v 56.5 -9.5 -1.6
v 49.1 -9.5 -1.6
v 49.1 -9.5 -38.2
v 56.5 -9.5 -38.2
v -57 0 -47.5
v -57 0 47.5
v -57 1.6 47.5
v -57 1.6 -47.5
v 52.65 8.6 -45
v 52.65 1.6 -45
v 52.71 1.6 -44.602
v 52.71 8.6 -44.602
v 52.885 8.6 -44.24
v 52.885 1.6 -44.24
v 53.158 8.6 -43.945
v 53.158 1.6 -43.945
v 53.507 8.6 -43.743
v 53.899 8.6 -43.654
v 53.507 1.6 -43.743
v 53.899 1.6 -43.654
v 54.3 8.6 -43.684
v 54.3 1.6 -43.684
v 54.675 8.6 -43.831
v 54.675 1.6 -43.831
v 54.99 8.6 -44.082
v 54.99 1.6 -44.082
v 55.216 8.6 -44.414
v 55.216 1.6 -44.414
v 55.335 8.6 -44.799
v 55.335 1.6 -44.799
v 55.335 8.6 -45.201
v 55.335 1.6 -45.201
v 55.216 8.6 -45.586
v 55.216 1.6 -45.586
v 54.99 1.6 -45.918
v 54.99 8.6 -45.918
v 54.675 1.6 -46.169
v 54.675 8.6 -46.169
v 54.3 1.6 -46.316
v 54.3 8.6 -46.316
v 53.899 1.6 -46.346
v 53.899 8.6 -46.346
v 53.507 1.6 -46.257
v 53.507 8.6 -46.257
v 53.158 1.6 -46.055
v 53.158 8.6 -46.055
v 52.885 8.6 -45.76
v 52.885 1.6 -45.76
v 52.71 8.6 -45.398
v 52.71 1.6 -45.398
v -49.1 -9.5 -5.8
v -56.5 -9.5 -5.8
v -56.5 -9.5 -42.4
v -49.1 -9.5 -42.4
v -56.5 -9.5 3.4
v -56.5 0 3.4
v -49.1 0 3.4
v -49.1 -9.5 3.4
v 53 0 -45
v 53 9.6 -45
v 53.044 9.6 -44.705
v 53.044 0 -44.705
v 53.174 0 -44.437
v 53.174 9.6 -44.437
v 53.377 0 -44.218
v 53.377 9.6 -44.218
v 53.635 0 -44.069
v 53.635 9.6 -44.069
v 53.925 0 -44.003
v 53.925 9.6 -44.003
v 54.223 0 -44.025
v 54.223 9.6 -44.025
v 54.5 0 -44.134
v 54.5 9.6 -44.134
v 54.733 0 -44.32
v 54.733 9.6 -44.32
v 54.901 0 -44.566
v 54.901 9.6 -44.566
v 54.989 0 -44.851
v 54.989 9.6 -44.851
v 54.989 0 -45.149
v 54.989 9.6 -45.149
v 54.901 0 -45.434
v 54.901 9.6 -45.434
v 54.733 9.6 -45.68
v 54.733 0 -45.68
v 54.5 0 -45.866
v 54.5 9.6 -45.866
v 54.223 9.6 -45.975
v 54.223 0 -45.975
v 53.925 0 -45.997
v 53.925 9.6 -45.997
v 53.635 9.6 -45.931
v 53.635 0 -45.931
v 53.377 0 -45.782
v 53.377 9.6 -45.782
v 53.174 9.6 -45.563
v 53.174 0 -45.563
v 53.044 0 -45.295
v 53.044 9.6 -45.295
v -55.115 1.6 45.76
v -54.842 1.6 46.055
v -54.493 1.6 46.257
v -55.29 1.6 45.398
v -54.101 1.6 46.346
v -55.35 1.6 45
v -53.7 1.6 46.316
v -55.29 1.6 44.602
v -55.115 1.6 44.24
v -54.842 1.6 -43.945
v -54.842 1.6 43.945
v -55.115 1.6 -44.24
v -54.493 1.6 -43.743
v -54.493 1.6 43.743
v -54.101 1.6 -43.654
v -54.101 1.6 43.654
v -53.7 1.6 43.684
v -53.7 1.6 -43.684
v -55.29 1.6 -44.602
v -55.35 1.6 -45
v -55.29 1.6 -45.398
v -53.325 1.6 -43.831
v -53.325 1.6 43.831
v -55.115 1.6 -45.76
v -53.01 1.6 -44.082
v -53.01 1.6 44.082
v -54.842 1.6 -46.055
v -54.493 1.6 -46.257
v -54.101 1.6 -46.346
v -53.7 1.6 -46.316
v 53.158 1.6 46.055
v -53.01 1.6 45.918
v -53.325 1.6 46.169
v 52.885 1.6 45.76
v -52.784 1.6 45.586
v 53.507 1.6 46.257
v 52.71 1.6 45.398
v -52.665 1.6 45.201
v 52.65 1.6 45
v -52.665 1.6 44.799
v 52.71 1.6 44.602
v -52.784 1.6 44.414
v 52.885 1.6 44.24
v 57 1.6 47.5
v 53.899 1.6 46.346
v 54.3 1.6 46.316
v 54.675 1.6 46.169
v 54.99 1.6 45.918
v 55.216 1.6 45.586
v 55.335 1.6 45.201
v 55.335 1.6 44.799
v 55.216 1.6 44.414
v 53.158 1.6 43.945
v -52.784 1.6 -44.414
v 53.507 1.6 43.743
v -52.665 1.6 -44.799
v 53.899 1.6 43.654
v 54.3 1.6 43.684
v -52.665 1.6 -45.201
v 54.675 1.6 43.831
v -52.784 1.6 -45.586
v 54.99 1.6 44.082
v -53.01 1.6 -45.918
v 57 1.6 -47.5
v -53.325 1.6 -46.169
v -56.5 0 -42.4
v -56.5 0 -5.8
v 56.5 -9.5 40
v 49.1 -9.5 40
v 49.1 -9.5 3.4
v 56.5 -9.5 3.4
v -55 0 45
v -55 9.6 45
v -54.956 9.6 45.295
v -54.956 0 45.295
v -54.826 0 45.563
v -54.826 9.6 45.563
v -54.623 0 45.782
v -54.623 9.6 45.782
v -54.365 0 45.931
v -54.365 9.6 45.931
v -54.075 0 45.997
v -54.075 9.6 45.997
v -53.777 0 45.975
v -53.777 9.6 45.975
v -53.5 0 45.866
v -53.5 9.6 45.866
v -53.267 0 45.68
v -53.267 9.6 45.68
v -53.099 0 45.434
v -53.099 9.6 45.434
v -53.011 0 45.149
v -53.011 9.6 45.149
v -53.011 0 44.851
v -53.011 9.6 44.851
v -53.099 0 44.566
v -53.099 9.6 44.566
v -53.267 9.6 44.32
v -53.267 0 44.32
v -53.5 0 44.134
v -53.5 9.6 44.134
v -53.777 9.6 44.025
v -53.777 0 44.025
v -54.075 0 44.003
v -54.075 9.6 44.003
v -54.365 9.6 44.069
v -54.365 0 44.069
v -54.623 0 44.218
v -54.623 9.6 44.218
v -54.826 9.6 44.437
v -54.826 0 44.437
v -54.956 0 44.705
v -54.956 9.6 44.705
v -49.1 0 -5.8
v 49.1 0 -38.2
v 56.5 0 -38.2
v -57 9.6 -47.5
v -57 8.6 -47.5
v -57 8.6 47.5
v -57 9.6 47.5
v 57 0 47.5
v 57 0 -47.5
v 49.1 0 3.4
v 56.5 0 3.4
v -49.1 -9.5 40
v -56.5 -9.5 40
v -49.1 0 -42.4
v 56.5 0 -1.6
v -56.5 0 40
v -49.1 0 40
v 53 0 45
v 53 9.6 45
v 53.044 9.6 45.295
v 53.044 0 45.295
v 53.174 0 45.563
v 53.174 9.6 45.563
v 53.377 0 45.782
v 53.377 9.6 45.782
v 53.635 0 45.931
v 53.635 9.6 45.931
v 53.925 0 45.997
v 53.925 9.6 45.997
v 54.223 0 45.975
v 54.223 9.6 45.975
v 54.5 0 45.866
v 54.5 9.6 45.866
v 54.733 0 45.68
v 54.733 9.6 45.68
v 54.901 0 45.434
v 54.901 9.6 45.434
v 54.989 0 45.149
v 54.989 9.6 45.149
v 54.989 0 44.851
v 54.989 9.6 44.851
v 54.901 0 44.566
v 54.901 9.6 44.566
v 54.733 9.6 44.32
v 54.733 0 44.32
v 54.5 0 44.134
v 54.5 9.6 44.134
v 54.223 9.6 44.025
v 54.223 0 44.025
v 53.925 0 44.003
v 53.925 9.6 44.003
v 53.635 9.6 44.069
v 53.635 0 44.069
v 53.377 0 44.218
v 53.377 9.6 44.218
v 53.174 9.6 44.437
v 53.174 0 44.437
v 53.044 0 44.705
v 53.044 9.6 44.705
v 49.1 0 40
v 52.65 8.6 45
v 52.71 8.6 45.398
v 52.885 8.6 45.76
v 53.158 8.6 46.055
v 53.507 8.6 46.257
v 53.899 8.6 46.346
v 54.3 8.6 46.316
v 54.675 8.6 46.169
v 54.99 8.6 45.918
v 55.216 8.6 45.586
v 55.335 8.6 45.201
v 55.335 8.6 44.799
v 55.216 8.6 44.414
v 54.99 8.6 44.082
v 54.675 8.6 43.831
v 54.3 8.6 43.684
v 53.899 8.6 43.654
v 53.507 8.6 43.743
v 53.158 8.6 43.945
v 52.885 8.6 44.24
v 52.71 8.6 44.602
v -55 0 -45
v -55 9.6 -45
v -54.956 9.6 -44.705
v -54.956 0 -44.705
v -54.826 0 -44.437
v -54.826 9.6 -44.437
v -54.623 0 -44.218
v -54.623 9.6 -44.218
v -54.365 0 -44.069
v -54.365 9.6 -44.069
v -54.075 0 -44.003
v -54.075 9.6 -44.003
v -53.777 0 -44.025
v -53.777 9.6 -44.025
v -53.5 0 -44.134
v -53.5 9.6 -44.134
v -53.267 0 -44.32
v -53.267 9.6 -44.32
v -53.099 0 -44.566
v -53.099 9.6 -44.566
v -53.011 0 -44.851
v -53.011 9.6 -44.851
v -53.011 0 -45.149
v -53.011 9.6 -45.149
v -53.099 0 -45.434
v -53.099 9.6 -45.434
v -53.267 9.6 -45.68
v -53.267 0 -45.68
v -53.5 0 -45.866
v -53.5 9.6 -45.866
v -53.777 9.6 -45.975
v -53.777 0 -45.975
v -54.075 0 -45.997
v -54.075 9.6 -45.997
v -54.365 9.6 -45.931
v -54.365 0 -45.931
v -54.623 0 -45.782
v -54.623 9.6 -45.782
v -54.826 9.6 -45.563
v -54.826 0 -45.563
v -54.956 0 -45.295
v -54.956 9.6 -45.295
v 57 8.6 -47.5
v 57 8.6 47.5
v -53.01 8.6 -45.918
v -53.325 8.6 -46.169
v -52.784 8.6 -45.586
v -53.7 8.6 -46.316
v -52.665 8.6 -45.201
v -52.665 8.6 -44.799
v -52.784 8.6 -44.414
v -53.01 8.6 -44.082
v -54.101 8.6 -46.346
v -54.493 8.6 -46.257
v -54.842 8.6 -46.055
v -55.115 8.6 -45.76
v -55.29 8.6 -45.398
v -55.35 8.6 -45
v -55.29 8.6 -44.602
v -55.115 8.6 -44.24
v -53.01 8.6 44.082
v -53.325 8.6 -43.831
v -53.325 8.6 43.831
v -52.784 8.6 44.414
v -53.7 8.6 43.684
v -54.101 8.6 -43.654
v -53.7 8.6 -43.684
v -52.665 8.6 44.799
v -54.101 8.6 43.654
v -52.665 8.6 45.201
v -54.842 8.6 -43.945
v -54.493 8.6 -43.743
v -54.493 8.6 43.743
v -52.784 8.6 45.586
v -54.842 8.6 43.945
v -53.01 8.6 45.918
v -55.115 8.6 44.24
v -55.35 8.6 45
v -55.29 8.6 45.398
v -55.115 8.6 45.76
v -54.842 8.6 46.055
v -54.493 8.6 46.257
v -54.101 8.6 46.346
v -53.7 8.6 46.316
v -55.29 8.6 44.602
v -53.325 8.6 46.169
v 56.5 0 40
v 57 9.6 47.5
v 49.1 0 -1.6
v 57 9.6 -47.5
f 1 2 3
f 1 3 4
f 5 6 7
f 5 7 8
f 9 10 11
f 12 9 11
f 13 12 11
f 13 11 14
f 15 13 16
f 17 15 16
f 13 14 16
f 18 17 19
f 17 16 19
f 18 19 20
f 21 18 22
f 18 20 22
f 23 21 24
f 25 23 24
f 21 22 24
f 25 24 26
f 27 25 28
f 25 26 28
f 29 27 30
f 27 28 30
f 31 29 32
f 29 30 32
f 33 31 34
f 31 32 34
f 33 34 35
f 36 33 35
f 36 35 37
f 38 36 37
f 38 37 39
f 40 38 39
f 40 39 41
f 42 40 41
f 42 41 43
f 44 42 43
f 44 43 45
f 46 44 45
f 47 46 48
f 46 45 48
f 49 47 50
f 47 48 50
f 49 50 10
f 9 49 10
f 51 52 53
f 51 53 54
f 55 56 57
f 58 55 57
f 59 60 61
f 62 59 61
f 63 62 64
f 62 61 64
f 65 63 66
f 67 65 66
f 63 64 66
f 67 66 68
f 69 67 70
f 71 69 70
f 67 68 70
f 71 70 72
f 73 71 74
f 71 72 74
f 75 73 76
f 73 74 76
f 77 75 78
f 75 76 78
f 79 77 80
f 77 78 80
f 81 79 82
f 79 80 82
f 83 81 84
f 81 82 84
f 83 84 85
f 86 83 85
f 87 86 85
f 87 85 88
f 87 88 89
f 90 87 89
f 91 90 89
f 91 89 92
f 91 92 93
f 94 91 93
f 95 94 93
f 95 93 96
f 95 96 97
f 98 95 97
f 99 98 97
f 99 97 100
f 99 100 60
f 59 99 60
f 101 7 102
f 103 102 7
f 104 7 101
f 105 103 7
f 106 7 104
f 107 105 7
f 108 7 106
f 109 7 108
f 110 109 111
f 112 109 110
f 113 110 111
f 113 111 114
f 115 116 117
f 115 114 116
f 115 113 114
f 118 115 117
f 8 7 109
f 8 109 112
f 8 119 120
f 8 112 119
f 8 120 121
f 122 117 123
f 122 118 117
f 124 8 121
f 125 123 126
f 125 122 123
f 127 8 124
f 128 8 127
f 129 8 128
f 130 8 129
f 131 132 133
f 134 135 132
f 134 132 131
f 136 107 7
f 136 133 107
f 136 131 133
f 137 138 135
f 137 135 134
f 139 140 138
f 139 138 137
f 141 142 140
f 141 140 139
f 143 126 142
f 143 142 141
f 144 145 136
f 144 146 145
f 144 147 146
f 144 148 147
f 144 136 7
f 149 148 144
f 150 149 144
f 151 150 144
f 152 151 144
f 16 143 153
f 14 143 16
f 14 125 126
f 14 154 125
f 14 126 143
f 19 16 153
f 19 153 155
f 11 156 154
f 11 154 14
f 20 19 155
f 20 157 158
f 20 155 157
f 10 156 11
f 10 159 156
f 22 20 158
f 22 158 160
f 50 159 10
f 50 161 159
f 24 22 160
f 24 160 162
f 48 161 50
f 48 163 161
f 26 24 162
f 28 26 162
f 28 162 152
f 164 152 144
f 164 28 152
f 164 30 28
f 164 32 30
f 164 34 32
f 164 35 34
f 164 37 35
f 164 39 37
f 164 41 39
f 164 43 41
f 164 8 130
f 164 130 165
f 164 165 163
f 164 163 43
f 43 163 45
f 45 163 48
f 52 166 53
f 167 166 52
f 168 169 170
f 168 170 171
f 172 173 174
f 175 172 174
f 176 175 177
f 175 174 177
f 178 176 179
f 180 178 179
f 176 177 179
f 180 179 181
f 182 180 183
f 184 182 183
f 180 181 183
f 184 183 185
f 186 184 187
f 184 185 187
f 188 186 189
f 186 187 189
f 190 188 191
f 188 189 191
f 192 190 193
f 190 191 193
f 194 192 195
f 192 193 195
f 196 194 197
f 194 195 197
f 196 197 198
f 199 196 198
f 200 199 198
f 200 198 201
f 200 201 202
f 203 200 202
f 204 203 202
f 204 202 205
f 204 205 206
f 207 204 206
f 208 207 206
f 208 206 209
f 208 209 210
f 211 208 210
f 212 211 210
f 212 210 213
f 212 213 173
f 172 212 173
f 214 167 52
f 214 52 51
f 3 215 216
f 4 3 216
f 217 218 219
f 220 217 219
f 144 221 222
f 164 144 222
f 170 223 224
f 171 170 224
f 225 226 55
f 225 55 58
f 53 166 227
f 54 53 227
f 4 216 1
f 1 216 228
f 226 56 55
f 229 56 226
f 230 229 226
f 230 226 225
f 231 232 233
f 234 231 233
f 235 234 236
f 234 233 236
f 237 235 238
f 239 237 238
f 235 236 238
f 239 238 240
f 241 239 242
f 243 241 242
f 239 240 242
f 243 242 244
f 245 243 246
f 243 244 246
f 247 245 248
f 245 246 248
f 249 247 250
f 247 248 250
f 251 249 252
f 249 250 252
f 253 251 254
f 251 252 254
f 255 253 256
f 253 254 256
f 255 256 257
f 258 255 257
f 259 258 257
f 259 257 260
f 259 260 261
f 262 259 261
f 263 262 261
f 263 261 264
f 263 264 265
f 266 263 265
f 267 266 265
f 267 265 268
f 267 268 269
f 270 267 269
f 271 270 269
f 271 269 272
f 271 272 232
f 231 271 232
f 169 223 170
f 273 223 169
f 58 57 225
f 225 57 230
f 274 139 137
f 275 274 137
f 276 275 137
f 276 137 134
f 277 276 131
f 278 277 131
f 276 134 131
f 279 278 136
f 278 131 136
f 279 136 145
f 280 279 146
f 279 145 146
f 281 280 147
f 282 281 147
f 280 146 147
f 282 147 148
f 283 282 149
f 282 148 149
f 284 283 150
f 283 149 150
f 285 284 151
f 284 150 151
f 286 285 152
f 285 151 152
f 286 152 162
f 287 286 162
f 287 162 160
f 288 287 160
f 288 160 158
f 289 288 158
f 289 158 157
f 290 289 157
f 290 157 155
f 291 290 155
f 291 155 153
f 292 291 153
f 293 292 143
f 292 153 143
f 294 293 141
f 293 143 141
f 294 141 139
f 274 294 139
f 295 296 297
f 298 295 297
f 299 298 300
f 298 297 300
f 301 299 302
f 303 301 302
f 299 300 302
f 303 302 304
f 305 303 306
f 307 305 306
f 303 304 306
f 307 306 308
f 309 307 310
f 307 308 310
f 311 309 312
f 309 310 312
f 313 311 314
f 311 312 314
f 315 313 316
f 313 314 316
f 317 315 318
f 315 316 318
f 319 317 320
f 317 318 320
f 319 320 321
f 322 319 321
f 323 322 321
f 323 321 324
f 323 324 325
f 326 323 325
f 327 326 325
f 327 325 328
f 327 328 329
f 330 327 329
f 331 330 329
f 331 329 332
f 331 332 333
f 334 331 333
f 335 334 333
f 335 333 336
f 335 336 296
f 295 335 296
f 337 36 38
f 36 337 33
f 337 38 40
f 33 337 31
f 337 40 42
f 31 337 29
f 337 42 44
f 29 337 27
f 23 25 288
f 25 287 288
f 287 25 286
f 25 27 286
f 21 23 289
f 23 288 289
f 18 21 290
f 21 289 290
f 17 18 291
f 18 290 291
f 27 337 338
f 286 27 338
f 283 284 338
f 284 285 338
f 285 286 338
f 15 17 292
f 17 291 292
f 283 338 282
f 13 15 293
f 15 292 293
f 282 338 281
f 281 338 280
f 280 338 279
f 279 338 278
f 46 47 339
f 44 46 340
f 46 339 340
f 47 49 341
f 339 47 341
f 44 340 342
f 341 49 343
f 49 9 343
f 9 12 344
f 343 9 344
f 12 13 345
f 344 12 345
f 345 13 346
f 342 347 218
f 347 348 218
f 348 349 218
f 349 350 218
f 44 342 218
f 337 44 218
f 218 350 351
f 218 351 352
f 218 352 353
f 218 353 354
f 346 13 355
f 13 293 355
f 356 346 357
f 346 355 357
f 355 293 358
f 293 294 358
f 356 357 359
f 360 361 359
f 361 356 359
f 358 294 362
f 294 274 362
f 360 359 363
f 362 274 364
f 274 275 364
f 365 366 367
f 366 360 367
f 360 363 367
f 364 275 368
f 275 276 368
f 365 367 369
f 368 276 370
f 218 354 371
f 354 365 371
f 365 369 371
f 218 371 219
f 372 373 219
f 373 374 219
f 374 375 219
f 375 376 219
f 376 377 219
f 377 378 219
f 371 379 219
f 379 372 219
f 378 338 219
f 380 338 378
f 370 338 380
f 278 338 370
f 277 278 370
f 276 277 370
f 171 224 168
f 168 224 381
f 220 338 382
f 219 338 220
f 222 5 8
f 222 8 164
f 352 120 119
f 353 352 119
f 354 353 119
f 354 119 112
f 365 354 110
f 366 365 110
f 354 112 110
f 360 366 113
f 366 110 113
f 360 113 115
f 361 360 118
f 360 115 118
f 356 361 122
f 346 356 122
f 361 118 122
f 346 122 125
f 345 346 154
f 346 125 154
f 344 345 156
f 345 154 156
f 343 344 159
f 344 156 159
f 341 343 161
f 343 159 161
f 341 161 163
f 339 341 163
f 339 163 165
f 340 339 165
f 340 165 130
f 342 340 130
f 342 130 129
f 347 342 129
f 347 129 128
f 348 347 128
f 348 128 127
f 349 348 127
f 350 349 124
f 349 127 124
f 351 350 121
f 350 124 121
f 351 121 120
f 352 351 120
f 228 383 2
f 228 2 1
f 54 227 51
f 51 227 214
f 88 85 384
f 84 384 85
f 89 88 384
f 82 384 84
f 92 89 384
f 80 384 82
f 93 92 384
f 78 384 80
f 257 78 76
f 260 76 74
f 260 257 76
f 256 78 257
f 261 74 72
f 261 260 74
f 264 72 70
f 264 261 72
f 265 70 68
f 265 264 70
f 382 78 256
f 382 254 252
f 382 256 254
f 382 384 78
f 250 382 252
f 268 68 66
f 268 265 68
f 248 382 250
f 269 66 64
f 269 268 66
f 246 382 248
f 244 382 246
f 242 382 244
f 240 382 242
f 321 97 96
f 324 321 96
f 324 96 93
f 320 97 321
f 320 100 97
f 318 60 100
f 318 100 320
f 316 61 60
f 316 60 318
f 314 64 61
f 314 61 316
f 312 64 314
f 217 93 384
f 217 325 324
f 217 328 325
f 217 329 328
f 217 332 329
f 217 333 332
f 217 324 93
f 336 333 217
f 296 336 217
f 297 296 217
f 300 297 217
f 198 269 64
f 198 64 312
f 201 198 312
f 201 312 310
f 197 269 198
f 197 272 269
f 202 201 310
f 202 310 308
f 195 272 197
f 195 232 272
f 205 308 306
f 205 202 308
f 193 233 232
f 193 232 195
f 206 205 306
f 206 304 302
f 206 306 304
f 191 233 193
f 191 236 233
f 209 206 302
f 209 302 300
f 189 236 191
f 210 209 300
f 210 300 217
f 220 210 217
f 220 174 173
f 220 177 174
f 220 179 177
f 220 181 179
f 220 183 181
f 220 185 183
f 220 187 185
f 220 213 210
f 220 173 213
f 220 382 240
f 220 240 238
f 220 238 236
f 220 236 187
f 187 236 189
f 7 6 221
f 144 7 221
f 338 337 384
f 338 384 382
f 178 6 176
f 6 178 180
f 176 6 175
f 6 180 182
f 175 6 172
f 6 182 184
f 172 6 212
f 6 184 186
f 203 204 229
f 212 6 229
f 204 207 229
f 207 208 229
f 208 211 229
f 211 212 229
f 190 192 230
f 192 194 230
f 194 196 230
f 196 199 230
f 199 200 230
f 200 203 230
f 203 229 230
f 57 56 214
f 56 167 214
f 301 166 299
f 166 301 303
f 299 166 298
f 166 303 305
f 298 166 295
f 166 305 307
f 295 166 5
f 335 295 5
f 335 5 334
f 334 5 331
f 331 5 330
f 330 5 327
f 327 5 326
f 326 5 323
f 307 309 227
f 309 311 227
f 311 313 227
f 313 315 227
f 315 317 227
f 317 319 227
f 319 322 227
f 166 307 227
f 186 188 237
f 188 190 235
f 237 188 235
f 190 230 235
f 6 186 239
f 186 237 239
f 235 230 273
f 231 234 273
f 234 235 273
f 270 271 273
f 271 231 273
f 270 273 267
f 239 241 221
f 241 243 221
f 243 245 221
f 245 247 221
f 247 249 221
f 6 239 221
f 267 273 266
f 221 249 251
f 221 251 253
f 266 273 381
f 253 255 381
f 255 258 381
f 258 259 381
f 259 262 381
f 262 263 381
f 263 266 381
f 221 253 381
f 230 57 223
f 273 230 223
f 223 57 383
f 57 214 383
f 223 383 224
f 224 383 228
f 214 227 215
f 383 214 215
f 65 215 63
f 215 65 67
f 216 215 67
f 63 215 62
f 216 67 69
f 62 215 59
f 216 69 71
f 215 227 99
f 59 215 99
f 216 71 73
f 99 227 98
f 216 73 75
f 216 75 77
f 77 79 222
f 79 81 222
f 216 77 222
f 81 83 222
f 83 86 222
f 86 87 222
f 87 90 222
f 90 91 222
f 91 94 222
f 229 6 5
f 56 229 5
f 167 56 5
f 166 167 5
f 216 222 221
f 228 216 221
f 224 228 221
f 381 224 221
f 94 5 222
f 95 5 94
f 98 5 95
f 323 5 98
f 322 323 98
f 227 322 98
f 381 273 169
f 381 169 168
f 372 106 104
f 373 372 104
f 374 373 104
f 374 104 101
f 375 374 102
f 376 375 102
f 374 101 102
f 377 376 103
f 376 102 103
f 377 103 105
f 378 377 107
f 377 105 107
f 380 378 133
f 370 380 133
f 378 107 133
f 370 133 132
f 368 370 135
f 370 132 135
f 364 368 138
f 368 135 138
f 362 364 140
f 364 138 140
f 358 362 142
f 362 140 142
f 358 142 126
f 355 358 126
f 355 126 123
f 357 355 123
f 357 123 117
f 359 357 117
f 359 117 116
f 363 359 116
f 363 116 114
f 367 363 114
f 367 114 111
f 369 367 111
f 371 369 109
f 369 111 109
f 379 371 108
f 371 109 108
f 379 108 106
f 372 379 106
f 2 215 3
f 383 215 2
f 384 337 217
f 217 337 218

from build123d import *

# Parameters (mm, degrees)
SKETCH3_W          = 114
SKETCH3_H          = 95
EXTRUDE1_DEPTH     = 1.6
SKETCH4_W          = 7.4
SKETCH4_H          = 36.6
EXTRUDE2_DEPTH     = 9.5
SKETCH5_R          = 1.35
EXTRUDE3_DEPTH     = 7
SKETCH7_W          = 114
SKETCH7_H          = 95
EXTRUDE4_DEPTH     = 1
SKETCH8_R          = 1
CUT_EXTRUDE1_DEPTH = 20.1


with BuildPart() as part:
    # Sketch3 → Extrude1 (new body)
    with BuildSketch(Plane(origin=(0, 0, 0), x_dir=(1, 0, 0), z_dir=(0, 1, 0))):
        Rectangle(SKETCH3_W, SKETCH3_H)
    extrude(amount=EXTRUDE1_DEPTH)

    # Sketch4 → Extrude2 (add)
    with BuildSketch(Plane.XZ):
        with Locations((-52.8, 21.7)):
            Rectangle(SKETCH4_W, SKETCH4_H)
        with Locations((-52.8, -24.1)):
            Rectangle(SKETCH4_W, SKETCH4_H)
        with Locations((52.8, 21.7)):
            Rectangle(SKETCH4_W, SKETCH4_H)
        with Locations((52.8, -19.9)):
            Rectangle(SKETCH4_W, SKETCH4_H)
    extrude(amount=EXTRUDE2_DEPTH)

    # Sketch5 → Extrude3 (add)
    with BuildSketch(Plane(origin=(0, 1.6, 0), x_dir=(-1, 0, 0), z_dir=(0, 1, 0))):
        with Locations((54, -45)):
            Circle(SKETCH5_R)
        with Locations((54, 45)):
            Circle(SKETCH5_R)
        with Locations((-54, 45)):
            Circle(SKETCH5_R)
        with Locations((-54, -45)):
            Circle(SKETCH5_R)
    extrude(amount=EXTRUDE3_DEPTH)

    # Sketch7 → Extrude4 (add)
    with BuildSketch(Plane(origin=(0, 8.6, 0), x_dir=(-1, 0, 0), z_dir=(0, 1, 0))):
        Rectangle(SKETCH7_W, SKETCH7_H)
    extrude(amount=EXTRUDE4_DEPTH)

    # Sketch8 → Cut-Extrude1 (cut, through all)
    with BuildSketch(Plane(origin=(0, 9.6, 0), x_dir=(-1, 0, 0), z_dir=(0, 1, 0))):
        with Locations((54, -45)):
            Circle(SKETCH8_R)
        with Locations((54, 45)):
            Circle(SKETCH8_R)
        with Locations((-54, 45)):
            Circle(SKETCH8_R)
        with Locations((-54, -45)):
            Circle(SKETCH8_R)
    extrude(amount=-CUT_EXTRUDE1_DEPTH, mode=Mode.SUBTRACT)


solid = part.part
